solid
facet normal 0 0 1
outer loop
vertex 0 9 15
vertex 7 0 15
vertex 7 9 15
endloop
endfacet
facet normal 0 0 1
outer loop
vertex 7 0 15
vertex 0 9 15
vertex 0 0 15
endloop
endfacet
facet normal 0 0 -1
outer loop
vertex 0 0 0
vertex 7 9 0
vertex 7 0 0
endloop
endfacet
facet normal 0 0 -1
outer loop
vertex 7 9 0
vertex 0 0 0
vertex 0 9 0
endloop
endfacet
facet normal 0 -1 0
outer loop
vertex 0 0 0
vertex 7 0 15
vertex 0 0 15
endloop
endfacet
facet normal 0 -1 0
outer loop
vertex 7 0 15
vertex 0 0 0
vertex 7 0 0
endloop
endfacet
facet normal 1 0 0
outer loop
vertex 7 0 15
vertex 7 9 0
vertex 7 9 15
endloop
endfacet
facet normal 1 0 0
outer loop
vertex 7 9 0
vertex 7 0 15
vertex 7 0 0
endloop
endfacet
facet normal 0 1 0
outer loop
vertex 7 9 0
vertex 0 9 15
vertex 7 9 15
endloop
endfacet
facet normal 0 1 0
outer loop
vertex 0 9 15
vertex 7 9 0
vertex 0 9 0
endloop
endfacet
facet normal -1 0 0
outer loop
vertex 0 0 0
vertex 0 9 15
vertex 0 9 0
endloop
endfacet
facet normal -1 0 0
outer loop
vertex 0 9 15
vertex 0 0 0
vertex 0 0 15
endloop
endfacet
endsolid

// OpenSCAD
// Generated by SolidPython 1.0.1 on 2020-07-29 00:46:55


cube(size = [7, 9, 15]);
/***********************************************
*********      SolidPython code:      **********
************************************************
 
# import packages: SolidPython
from solid import *
from solid.utils import *
from itertools import chain, combinations, permutations


class Resize:

    def __init__(self, scad_file):
        self.scad_file = scad_file
        #self.scad_file = import_scad(scad_file)
        # cone/cylinder param:
        self.r1 = 0
        self.r2 = 0
        self.h = 0
        # rectangular prism param:
        self.w = 0
        self.l = 0
        # ellipse param:
        self.r = 0

    # import OpenScad code (file name corresponds to shape)


    # classify shape + parameters
    def assign(self, param1, param2, param3):
        if self.scad_file == 'cone.scad':
            self.r1 = param1
            self.r2 = param2
            self.h = param3
        elif self.scad_file == 'cylinder.scad':
            self.r1 = param1
            self.r2 = param2
            self.h = param3
        elif self.scad_file == 'rectangularPrism.scad':
            self.h = param1
            self.l = param2
            self.w = param3
        else:
            self.r = param1
            self.h = param2

    # resize parameters
    def iterate(self):
        x = range(3, 20, 2)
        i = 1
        if self.scad_file == 'cone.scad':
            tempList = list(permutations(x, 2))
            for temp in tempList:
                param1 = temp[0]
                param2 = temp[1]
                filepath = 'produced_scad_files/' + 'cone' + str(param1) + '_' + str(param2) + '_' + '.scad'
                scad_render_to_file(cylinder(h=param1, r1=param2, r2=0), filepath)

        elif self.scad_file == 'cylinder.scad':
            tempList = list(permutations(x, 3))
            for temp in tempList:
                param1 = temp[0]
                param2 = temp[1]
                filepath = 'produced_scad_files/' + 'cylinder' + str(param1) + '_' + str(param2) + '_' + '.scad'
                scad_render_to_file(cylinder(h=param1, r1=param2, r2=param2), filepath)

        elif self.scad_file == 'rectangularPrism.scad':
            tempList = list(permutations(x, 3))
            for temp in tempList:
                param1 = temp[0]
                param2 = temp[1]
                param3 = temp[2]
                filepath = 'produced_scad_files/' + 'rectangularPrism' + str(param1) + '_' + str(param2) + '_' + str(
                    param3) + '.scad'
                scad_render_to_file(cube(size=(param1, param2, param3)), filepath)

        elif self.scad_file == 'ellipse.scad':
            tempList = list(permutations(x, 4))
            for temp in tempList:
                param1 = temp[0]
                param2 = temp[1]
                param3 = temp[2]
                param4 = temp[3]
                filepath = 'produced_scad_files/' + 'ellipse' + str(param1) + '_' + str(param2) + '_' + str(param3) + '_' + str(param4) + '.scad'
                scad_render_to_file(scale([param1, param2, param3])(sphere(r=param4)), filepath)

    def render_to_scadfile(self):
        scad_render_to_file(scad, 'example.scad') 
 
************************************************/
